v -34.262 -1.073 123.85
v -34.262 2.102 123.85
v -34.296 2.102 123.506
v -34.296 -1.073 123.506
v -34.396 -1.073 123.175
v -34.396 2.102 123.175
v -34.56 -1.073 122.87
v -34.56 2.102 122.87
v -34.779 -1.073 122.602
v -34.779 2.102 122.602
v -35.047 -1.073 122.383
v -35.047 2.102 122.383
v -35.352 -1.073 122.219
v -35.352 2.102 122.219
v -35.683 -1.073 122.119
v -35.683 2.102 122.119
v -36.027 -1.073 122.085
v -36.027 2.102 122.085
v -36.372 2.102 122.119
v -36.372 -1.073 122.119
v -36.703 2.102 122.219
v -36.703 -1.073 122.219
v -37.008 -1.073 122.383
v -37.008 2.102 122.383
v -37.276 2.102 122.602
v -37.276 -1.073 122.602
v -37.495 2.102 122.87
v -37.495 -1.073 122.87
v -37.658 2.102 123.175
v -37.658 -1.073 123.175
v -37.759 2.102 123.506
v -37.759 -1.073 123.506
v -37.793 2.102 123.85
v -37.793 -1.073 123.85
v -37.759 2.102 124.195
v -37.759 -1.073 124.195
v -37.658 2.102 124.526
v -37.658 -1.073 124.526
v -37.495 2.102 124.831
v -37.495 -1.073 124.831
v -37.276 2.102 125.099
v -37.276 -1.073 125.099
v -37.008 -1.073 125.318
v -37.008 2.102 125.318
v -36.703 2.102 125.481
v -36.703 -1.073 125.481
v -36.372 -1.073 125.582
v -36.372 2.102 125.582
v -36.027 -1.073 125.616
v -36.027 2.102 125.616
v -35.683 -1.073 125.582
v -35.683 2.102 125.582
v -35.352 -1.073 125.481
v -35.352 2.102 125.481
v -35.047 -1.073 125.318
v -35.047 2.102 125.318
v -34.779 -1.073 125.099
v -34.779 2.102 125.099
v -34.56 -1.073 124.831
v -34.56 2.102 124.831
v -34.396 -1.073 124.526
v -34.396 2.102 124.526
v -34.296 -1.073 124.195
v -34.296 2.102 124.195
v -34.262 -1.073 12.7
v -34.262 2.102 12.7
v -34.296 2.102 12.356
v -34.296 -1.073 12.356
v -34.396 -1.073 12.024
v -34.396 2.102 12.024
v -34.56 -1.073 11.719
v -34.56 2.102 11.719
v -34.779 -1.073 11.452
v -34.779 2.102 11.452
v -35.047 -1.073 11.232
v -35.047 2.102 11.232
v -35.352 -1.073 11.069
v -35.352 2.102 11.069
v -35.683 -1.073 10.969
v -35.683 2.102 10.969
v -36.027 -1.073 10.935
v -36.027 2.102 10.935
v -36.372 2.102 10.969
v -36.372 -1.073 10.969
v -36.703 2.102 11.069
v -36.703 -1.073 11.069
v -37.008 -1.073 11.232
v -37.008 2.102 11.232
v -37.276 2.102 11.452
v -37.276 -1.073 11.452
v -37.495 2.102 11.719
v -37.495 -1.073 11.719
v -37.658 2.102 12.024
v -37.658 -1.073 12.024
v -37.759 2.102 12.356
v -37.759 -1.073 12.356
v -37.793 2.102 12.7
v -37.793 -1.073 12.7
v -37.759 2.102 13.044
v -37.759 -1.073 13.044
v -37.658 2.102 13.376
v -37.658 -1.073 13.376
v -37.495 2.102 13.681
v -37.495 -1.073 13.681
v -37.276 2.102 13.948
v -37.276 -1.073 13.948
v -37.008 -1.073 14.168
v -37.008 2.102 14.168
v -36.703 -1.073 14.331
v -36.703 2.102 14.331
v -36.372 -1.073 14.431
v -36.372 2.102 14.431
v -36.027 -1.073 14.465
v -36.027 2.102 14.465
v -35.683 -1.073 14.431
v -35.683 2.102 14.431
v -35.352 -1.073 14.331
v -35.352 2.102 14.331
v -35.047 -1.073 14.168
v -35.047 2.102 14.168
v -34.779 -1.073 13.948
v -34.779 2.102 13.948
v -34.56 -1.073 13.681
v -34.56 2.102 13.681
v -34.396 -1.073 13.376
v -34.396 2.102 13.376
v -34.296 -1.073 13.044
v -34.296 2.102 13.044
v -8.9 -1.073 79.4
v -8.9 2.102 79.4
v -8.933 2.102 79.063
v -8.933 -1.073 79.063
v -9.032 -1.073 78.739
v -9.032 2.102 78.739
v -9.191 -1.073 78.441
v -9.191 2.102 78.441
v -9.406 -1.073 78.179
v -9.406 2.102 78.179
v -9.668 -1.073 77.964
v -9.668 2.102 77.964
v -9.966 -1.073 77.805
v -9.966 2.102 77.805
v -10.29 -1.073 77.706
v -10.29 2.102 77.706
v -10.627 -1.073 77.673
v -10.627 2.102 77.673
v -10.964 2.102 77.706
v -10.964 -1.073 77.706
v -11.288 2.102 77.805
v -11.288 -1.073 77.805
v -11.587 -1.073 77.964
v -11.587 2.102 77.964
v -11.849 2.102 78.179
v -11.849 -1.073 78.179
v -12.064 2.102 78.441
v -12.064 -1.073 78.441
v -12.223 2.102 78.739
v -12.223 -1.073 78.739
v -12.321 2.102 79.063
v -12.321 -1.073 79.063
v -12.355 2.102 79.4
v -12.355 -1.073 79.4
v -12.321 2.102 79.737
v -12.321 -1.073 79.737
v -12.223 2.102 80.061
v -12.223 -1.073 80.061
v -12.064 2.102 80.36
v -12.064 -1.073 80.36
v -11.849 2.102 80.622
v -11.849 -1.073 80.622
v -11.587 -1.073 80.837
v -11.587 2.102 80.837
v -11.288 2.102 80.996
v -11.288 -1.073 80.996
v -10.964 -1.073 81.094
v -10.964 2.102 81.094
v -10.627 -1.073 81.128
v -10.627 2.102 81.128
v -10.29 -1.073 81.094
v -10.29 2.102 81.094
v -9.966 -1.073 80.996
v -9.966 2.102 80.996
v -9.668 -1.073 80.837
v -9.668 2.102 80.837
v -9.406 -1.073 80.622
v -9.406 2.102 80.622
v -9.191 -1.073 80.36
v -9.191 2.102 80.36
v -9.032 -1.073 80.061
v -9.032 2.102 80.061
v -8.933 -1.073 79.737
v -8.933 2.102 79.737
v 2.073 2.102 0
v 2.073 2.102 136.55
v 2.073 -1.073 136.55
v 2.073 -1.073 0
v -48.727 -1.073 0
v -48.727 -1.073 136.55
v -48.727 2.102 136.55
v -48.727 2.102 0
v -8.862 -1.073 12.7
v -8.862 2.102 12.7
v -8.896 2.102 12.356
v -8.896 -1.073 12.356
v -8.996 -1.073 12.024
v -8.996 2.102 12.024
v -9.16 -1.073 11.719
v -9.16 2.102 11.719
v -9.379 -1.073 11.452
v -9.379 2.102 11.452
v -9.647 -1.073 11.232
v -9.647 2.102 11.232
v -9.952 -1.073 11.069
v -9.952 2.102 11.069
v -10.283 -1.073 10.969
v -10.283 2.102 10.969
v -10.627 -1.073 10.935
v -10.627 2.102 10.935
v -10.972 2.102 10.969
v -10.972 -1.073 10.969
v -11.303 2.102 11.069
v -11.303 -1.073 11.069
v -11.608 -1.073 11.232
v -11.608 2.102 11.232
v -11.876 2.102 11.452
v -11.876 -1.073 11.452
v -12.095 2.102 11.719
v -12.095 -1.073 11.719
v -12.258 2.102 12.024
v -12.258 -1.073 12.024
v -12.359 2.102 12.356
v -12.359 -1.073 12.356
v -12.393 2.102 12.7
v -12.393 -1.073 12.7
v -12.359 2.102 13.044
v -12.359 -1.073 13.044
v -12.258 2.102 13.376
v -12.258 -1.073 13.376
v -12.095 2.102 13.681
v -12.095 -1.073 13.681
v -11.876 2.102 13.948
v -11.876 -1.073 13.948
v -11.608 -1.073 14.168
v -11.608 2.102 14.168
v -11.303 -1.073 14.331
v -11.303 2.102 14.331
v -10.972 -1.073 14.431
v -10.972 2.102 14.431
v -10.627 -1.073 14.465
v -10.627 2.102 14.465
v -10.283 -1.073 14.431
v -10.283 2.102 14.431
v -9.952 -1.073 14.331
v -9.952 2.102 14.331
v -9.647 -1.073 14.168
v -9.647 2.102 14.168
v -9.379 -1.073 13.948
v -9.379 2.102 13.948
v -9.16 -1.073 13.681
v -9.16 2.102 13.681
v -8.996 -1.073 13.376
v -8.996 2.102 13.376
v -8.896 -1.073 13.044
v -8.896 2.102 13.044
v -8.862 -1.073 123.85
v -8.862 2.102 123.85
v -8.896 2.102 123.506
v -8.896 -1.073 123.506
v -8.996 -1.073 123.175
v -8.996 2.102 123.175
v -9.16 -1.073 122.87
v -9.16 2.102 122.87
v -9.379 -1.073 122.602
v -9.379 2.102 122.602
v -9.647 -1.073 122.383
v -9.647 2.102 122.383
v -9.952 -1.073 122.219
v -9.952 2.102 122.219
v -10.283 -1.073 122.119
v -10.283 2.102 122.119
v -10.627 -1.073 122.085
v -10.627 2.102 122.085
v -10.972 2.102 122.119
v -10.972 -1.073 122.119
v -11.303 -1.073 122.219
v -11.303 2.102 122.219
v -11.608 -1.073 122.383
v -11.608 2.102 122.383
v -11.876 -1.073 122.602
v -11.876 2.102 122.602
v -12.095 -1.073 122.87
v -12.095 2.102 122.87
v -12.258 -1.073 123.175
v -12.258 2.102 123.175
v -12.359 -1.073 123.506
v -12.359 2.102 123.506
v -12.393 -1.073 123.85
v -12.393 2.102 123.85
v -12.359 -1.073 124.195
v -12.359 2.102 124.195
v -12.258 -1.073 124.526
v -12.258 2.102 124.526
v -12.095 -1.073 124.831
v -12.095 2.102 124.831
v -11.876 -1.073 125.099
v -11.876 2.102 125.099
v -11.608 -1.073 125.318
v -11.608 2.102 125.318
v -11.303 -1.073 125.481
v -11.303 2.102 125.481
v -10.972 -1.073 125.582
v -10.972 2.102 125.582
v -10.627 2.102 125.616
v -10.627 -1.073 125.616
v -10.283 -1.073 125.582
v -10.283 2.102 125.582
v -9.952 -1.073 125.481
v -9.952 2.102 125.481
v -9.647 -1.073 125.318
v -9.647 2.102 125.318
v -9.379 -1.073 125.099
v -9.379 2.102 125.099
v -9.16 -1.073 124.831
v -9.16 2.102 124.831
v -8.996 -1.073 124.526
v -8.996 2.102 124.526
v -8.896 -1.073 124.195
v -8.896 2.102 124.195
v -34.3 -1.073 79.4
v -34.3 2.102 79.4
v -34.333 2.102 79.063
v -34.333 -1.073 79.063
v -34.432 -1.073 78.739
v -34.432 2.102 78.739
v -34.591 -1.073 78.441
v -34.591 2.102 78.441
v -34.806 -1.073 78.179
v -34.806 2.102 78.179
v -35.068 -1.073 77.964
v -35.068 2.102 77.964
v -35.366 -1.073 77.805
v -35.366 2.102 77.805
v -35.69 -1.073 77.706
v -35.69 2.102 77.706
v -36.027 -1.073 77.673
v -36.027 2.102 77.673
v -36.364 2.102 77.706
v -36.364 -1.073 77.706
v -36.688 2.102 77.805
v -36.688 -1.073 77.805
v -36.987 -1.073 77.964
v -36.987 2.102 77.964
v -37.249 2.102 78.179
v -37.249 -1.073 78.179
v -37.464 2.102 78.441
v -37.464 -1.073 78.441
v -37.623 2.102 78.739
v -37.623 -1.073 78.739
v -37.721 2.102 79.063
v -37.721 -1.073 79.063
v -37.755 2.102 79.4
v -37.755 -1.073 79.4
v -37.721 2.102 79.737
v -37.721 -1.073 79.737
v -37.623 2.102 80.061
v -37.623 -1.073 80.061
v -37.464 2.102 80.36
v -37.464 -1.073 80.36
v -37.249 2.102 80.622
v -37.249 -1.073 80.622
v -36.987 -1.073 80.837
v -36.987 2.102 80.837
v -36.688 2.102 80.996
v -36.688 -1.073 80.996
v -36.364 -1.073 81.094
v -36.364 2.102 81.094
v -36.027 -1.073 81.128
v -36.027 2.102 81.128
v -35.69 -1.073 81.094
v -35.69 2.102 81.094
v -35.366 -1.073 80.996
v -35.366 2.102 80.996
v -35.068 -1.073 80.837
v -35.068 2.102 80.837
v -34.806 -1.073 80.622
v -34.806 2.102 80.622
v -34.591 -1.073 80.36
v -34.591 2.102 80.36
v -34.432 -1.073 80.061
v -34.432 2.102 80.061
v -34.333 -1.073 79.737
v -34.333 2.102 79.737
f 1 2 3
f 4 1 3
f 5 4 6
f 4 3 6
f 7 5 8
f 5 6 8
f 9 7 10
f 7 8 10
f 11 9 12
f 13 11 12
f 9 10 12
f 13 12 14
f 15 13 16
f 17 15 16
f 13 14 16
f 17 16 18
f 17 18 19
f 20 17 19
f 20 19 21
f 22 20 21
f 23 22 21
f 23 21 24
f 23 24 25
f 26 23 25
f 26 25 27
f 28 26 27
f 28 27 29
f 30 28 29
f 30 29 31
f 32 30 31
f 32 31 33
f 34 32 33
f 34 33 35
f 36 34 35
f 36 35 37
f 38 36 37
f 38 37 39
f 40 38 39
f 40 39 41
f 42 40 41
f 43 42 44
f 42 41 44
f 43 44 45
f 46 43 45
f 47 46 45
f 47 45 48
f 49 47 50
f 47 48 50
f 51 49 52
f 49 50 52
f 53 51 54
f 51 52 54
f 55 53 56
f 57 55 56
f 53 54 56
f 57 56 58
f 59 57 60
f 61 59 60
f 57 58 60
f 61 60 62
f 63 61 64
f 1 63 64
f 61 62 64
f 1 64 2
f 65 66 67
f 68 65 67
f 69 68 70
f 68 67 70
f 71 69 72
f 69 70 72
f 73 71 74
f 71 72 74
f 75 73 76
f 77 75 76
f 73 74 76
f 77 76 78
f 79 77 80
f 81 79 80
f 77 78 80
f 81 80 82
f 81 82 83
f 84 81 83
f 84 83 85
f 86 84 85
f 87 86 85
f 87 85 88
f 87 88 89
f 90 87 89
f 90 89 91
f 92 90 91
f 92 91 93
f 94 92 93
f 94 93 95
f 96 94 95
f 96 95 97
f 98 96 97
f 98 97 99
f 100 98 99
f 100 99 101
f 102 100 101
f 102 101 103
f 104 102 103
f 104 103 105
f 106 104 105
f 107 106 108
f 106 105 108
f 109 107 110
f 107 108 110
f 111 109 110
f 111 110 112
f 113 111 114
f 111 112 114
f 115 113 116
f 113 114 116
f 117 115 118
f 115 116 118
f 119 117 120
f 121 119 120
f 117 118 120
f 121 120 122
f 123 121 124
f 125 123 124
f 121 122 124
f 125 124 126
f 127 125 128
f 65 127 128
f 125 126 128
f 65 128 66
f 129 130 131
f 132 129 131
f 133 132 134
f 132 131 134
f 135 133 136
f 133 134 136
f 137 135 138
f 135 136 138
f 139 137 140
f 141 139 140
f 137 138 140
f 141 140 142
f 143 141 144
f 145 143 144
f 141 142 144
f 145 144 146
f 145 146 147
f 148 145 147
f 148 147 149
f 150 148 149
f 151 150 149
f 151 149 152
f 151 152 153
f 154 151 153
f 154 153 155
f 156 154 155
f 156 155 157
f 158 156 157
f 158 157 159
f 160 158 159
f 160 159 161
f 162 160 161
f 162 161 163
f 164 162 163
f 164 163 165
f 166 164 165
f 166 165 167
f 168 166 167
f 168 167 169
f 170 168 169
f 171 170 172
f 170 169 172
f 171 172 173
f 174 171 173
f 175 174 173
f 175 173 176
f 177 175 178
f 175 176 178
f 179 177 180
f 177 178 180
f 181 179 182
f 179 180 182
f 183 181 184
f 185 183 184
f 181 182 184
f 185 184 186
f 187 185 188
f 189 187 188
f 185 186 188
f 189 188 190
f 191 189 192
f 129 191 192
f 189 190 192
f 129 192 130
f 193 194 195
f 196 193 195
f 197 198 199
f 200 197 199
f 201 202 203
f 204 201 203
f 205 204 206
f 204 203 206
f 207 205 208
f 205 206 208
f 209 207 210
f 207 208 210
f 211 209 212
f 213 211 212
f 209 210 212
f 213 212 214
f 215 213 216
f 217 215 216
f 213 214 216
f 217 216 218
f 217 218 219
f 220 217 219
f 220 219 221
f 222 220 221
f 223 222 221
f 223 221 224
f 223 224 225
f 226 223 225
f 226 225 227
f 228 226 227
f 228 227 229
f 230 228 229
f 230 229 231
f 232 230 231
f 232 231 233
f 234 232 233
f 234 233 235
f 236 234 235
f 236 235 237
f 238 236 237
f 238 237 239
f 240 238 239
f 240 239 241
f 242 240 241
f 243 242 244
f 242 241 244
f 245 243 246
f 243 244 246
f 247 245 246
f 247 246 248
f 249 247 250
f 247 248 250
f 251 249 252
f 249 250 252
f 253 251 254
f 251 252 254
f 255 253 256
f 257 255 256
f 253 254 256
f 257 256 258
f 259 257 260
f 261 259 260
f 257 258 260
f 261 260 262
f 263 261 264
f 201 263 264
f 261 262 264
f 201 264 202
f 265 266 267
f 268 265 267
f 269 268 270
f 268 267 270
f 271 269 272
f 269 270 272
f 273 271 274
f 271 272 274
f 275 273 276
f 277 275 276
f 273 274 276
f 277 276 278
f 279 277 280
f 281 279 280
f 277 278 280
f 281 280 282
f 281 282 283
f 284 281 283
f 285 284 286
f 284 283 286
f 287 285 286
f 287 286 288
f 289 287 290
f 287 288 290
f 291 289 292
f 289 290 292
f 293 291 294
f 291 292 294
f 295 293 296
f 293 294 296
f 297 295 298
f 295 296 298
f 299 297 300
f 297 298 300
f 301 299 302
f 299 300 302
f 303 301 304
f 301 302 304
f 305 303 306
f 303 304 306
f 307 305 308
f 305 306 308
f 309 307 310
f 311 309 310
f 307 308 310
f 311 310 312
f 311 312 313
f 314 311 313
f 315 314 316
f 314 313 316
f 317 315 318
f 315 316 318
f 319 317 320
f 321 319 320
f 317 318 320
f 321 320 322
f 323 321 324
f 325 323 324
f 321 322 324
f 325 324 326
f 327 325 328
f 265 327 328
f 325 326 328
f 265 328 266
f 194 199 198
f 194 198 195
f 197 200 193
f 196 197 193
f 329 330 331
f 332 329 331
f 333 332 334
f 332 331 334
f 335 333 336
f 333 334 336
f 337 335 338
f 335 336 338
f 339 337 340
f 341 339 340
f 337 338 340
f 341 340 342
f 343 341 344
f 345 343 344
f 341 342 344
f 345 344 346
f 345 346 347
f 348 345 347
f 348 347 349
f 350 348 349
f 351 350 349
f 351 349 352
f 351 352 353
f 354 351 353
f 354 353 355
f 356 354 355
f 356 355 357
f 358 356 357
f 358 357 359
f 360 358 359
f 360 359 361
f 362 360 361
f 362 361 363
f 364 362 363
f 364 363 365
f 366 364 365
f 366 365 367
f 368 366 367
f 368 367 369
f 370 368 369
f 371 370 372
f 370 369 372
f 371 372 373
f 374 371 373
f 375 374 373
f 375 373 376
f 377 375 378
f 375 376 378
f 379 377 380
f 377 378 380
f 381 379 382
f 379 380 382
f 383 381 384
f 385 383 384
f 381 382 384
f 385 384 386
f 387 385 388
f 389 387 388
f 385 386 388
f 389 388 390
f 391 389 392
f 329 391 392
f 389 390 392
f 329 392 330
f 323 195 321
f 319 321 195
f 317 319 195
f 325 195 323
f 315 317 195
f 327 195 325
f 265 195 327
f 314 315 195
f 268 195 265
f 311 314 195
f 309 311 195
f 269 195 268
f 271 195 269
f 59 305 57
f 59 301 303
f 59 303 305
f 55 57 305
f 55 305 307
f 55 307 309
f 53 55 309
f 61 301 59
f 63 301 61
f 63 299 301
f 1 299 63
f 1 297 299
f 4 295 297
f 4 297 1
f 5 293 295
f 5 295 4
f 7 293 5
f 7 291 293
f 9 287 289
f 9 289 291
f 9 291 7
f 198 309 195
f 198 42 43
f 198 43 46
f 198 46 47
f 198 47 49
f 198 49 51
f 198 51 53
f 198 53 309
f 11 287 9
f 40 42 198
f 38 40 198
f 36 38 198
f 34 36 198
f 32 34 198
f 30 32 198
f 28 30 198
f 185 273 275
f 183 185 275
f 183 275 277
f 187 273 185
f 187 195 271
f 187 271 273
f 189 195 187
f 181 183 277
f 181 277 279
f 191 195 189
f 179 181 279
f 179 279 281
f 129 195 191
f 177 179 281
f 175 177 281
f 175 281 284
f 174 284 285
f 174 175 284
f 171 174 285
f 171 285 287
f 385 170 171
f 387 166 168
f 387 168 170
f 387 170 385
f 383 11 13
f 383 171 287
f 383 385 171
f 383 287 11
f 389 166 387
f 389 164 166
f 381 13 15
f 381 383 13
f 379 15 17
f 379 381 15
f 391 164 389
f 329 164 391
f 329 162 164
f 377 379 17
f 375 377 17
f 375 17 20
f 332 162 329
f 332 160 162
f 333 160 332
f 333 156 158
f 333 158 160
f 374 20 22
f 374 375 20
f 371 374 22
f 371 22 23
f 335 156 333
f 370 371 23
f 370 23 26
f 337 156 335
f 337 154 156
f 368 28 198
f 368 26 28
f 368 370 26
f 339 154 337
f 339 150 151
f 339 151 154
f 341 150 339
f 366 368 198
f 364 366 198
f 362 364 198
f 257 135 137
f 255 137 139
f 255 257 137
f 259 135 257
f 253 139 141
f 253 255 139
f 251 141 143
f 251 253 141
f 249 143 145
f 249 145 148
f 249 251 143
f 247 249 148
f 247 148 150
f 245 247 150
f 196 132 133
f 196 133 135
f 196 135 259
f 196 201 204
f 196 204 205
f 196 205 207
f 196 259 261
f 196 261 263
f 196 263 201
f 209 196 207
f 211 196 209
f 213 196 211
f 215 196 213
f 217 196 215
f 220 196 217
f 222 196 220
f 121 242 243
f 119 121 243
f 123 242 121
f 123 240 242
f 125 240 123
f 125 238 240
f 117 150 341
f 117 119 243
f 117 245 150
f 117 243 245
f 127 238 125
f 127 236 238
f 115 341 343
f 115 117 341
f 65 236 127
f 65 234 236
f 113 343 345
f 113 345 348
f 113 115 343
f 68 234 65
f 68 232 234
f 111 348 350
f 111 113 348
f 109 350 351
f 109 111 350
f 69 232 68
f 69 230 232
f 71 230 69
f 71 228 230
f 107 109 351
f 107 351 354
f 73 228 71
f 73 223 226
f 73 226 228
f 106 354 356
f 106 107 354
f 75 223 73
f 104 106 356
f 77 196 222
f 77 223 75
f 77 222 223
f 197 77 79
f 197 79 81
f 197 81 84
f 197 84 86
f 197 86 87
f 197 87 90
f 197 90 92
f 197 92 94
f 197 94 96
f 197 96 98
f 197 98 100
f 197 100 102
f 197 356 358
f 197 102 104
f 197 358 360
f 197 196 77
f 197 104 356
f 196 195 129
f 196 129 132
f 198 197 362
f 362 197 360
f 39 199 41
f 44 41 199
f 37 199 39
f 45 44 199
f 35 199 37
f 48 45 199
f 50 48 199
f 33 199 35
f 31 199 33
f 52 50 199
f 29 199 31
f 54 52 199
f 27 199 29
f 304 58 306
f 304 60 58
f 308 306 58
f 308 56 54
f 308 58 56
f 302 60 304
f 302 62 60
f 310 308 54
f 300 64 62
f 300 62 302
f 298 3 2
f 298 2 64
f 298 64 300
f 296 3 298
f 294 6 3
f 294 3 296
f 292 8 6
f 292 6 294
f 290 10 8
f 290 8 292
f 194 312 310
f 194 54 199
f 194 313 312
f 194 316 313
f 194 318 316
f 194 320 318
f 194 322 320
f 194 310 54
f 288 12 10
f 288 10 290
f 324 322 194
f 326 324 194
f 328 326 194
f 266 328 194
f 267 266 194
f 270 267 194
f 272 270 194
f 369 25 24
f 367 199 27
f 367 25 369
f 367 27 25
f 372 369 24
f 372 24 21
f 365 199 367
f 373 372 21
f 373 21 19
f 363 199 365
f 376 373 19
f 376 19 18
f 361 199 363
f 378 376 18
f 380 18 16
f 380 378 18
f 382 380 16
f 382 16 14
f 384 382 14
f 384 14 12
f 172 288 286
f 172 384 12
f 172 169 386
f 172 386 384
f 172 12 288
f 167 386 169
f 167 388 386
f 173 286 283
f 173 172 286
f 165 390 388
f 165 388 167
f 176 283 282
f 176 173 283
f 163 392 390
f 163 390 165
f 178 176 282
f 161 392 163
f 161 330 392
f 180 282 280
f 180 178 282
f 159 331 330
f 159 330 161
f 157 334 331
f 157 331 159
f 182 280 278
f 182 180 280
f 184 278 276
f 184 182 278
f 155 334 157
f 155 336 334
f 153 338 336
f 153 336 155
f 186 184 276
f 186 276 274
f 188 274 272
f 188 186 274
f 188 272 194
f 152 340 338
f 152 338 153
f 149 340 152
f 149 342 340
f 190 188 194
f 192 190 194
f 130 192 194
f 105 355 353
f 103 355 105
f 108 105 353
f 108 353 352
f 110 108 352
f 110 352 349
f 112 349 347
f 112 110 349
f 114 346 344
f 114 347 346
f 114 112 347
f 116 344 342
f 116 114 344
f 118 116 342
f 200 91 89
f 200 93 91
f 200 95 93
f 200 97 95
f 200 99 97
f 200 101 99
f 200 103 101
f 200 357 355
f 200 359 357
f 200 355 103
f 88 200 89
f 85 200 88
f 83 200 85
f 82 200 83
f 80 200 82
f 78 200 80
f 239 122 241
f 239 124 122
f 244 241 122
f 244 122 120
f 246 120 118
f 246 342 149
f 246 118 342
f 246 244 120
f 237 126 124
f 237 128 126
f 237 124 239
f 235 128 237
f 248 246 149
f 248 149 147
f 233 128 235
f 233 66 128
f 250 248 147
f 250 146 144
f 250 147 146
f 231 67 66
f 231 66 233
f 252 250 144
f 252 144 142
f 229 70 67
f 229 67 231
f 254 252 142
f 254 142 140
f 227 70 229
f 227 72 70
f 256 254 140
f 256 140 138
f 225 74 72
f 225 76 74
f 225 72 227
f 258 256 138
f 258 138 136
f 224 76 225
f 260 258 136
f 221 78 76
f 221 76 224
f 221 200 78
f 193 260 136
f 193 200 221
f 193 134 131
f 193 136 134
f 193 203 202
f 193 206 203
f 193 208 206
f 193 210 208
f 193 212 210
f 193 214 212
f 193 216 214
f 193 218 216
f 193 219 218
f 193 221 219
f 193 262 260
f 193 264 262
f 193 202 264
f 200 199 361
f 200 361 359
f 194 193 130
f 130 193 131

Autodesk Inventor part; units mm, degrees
ref_plane "YZ Plane" through (0, 0, 0) normal (1, 0, 0) x (0, 1, 0)
ref_plane "XZ Plane" through (0, 0, 0) normal (0, 1, 0) x (-1, 0, 0)
ref_plane "XY Plane" through (0, 0, 0) normal (0, 0, 1) x (1, 0, 0)
sketch "Sketch1" plane through (0, 0, 0) normal (0, 0, 1) x (1, 0, 0)
  line L0 (-48.7274, 2.102) -> (2.0726, 2.102)
  line L1 (2.0726, 2.102) -> (2.0726, -1.073)
  line L2 (2.0726, -1.073) -> (-48.7274, -1.073)
  line L3 (-48.7274, -1.073) -> (-48.7274, 2.102)
  point P0 (0, 0)
  dimension "d0" = 3.175
  dimension "d1" = 50.8
extrude "Extrusion1" add sketch "Sketch1" along normal blind 136.5504
sketch "Sketch2" plane through (-48.7274, 2.102, 0) normal (0, 1, 0) x (1, 0, 0)
  circle A0 centre (12.7, -12.7) radius 1.7653
  circle A1 centre (38.1, -12.7) radius 1.7653
  circle A2 centre (12.7, -123.8504) radius 1.7653
  circle A3 centre (38.1, -123.8504) radius 1.7653
  line L0 (12.7, -123.8504) -> (38.1, -123.8504) construction
  line L1 (38.1, -123.8504) -> (38.1, -12.7) construction
  line L2 (38.1, -12.7) -> (12.7, -12.7) construction
  line L3 (12.7, -12.7) -> (12.7, -123.8504) construction
  line L4 (50.8, 0) -> (0, 0) projected
  line L5 (50.8, 0) -> (50.8, -136.5504) projected
  point P0 (48.7274, 0)
  dimension "d5" = 3.5306
  dimension "d6" = 111.1504
  dimension "d7" = 12.7
  dimension "d8" = 25.4
  dimension "d9" = 12.7
extrude "Extrusion2" cut sketch "Sketch2" against normal through all
sketch "Sketch3" plane through (-48.7274, 2.102, 0) normal (0, 1, 0) x (1, 0, 0)
  circle A0 centre (12.7, -79.4004) radius 1.7272
  circle A1 centre (38.1, -79.4004) radius 1.7272
  line L0 (12.7, -79.4004) -> (38.1, -79.4004) construction
  line L1 (0, 0) -> (0, -136.5504) projected
  circle A2 centre (12.7, -12.7) radius 1.7653 projected
  circle A3 centre (12.7, -123.8504) radius 1.7653 projected
  point P0 (48.7274, 0)
  point P1 (25.4, -79.4004)
  dimension "d12" = 3.4544
  dimension "d13" = 25.4
  dimension "d14" = 12.7
  dimension "d18" = 44.45
extrude "Extrusion3" cut sketch "Sketch3" against normal through all contours A0 | A1
equation "\"d3\" = d2"
equation "\"d2\" = 136.5504"
properties part number "Flat Bar KY"
